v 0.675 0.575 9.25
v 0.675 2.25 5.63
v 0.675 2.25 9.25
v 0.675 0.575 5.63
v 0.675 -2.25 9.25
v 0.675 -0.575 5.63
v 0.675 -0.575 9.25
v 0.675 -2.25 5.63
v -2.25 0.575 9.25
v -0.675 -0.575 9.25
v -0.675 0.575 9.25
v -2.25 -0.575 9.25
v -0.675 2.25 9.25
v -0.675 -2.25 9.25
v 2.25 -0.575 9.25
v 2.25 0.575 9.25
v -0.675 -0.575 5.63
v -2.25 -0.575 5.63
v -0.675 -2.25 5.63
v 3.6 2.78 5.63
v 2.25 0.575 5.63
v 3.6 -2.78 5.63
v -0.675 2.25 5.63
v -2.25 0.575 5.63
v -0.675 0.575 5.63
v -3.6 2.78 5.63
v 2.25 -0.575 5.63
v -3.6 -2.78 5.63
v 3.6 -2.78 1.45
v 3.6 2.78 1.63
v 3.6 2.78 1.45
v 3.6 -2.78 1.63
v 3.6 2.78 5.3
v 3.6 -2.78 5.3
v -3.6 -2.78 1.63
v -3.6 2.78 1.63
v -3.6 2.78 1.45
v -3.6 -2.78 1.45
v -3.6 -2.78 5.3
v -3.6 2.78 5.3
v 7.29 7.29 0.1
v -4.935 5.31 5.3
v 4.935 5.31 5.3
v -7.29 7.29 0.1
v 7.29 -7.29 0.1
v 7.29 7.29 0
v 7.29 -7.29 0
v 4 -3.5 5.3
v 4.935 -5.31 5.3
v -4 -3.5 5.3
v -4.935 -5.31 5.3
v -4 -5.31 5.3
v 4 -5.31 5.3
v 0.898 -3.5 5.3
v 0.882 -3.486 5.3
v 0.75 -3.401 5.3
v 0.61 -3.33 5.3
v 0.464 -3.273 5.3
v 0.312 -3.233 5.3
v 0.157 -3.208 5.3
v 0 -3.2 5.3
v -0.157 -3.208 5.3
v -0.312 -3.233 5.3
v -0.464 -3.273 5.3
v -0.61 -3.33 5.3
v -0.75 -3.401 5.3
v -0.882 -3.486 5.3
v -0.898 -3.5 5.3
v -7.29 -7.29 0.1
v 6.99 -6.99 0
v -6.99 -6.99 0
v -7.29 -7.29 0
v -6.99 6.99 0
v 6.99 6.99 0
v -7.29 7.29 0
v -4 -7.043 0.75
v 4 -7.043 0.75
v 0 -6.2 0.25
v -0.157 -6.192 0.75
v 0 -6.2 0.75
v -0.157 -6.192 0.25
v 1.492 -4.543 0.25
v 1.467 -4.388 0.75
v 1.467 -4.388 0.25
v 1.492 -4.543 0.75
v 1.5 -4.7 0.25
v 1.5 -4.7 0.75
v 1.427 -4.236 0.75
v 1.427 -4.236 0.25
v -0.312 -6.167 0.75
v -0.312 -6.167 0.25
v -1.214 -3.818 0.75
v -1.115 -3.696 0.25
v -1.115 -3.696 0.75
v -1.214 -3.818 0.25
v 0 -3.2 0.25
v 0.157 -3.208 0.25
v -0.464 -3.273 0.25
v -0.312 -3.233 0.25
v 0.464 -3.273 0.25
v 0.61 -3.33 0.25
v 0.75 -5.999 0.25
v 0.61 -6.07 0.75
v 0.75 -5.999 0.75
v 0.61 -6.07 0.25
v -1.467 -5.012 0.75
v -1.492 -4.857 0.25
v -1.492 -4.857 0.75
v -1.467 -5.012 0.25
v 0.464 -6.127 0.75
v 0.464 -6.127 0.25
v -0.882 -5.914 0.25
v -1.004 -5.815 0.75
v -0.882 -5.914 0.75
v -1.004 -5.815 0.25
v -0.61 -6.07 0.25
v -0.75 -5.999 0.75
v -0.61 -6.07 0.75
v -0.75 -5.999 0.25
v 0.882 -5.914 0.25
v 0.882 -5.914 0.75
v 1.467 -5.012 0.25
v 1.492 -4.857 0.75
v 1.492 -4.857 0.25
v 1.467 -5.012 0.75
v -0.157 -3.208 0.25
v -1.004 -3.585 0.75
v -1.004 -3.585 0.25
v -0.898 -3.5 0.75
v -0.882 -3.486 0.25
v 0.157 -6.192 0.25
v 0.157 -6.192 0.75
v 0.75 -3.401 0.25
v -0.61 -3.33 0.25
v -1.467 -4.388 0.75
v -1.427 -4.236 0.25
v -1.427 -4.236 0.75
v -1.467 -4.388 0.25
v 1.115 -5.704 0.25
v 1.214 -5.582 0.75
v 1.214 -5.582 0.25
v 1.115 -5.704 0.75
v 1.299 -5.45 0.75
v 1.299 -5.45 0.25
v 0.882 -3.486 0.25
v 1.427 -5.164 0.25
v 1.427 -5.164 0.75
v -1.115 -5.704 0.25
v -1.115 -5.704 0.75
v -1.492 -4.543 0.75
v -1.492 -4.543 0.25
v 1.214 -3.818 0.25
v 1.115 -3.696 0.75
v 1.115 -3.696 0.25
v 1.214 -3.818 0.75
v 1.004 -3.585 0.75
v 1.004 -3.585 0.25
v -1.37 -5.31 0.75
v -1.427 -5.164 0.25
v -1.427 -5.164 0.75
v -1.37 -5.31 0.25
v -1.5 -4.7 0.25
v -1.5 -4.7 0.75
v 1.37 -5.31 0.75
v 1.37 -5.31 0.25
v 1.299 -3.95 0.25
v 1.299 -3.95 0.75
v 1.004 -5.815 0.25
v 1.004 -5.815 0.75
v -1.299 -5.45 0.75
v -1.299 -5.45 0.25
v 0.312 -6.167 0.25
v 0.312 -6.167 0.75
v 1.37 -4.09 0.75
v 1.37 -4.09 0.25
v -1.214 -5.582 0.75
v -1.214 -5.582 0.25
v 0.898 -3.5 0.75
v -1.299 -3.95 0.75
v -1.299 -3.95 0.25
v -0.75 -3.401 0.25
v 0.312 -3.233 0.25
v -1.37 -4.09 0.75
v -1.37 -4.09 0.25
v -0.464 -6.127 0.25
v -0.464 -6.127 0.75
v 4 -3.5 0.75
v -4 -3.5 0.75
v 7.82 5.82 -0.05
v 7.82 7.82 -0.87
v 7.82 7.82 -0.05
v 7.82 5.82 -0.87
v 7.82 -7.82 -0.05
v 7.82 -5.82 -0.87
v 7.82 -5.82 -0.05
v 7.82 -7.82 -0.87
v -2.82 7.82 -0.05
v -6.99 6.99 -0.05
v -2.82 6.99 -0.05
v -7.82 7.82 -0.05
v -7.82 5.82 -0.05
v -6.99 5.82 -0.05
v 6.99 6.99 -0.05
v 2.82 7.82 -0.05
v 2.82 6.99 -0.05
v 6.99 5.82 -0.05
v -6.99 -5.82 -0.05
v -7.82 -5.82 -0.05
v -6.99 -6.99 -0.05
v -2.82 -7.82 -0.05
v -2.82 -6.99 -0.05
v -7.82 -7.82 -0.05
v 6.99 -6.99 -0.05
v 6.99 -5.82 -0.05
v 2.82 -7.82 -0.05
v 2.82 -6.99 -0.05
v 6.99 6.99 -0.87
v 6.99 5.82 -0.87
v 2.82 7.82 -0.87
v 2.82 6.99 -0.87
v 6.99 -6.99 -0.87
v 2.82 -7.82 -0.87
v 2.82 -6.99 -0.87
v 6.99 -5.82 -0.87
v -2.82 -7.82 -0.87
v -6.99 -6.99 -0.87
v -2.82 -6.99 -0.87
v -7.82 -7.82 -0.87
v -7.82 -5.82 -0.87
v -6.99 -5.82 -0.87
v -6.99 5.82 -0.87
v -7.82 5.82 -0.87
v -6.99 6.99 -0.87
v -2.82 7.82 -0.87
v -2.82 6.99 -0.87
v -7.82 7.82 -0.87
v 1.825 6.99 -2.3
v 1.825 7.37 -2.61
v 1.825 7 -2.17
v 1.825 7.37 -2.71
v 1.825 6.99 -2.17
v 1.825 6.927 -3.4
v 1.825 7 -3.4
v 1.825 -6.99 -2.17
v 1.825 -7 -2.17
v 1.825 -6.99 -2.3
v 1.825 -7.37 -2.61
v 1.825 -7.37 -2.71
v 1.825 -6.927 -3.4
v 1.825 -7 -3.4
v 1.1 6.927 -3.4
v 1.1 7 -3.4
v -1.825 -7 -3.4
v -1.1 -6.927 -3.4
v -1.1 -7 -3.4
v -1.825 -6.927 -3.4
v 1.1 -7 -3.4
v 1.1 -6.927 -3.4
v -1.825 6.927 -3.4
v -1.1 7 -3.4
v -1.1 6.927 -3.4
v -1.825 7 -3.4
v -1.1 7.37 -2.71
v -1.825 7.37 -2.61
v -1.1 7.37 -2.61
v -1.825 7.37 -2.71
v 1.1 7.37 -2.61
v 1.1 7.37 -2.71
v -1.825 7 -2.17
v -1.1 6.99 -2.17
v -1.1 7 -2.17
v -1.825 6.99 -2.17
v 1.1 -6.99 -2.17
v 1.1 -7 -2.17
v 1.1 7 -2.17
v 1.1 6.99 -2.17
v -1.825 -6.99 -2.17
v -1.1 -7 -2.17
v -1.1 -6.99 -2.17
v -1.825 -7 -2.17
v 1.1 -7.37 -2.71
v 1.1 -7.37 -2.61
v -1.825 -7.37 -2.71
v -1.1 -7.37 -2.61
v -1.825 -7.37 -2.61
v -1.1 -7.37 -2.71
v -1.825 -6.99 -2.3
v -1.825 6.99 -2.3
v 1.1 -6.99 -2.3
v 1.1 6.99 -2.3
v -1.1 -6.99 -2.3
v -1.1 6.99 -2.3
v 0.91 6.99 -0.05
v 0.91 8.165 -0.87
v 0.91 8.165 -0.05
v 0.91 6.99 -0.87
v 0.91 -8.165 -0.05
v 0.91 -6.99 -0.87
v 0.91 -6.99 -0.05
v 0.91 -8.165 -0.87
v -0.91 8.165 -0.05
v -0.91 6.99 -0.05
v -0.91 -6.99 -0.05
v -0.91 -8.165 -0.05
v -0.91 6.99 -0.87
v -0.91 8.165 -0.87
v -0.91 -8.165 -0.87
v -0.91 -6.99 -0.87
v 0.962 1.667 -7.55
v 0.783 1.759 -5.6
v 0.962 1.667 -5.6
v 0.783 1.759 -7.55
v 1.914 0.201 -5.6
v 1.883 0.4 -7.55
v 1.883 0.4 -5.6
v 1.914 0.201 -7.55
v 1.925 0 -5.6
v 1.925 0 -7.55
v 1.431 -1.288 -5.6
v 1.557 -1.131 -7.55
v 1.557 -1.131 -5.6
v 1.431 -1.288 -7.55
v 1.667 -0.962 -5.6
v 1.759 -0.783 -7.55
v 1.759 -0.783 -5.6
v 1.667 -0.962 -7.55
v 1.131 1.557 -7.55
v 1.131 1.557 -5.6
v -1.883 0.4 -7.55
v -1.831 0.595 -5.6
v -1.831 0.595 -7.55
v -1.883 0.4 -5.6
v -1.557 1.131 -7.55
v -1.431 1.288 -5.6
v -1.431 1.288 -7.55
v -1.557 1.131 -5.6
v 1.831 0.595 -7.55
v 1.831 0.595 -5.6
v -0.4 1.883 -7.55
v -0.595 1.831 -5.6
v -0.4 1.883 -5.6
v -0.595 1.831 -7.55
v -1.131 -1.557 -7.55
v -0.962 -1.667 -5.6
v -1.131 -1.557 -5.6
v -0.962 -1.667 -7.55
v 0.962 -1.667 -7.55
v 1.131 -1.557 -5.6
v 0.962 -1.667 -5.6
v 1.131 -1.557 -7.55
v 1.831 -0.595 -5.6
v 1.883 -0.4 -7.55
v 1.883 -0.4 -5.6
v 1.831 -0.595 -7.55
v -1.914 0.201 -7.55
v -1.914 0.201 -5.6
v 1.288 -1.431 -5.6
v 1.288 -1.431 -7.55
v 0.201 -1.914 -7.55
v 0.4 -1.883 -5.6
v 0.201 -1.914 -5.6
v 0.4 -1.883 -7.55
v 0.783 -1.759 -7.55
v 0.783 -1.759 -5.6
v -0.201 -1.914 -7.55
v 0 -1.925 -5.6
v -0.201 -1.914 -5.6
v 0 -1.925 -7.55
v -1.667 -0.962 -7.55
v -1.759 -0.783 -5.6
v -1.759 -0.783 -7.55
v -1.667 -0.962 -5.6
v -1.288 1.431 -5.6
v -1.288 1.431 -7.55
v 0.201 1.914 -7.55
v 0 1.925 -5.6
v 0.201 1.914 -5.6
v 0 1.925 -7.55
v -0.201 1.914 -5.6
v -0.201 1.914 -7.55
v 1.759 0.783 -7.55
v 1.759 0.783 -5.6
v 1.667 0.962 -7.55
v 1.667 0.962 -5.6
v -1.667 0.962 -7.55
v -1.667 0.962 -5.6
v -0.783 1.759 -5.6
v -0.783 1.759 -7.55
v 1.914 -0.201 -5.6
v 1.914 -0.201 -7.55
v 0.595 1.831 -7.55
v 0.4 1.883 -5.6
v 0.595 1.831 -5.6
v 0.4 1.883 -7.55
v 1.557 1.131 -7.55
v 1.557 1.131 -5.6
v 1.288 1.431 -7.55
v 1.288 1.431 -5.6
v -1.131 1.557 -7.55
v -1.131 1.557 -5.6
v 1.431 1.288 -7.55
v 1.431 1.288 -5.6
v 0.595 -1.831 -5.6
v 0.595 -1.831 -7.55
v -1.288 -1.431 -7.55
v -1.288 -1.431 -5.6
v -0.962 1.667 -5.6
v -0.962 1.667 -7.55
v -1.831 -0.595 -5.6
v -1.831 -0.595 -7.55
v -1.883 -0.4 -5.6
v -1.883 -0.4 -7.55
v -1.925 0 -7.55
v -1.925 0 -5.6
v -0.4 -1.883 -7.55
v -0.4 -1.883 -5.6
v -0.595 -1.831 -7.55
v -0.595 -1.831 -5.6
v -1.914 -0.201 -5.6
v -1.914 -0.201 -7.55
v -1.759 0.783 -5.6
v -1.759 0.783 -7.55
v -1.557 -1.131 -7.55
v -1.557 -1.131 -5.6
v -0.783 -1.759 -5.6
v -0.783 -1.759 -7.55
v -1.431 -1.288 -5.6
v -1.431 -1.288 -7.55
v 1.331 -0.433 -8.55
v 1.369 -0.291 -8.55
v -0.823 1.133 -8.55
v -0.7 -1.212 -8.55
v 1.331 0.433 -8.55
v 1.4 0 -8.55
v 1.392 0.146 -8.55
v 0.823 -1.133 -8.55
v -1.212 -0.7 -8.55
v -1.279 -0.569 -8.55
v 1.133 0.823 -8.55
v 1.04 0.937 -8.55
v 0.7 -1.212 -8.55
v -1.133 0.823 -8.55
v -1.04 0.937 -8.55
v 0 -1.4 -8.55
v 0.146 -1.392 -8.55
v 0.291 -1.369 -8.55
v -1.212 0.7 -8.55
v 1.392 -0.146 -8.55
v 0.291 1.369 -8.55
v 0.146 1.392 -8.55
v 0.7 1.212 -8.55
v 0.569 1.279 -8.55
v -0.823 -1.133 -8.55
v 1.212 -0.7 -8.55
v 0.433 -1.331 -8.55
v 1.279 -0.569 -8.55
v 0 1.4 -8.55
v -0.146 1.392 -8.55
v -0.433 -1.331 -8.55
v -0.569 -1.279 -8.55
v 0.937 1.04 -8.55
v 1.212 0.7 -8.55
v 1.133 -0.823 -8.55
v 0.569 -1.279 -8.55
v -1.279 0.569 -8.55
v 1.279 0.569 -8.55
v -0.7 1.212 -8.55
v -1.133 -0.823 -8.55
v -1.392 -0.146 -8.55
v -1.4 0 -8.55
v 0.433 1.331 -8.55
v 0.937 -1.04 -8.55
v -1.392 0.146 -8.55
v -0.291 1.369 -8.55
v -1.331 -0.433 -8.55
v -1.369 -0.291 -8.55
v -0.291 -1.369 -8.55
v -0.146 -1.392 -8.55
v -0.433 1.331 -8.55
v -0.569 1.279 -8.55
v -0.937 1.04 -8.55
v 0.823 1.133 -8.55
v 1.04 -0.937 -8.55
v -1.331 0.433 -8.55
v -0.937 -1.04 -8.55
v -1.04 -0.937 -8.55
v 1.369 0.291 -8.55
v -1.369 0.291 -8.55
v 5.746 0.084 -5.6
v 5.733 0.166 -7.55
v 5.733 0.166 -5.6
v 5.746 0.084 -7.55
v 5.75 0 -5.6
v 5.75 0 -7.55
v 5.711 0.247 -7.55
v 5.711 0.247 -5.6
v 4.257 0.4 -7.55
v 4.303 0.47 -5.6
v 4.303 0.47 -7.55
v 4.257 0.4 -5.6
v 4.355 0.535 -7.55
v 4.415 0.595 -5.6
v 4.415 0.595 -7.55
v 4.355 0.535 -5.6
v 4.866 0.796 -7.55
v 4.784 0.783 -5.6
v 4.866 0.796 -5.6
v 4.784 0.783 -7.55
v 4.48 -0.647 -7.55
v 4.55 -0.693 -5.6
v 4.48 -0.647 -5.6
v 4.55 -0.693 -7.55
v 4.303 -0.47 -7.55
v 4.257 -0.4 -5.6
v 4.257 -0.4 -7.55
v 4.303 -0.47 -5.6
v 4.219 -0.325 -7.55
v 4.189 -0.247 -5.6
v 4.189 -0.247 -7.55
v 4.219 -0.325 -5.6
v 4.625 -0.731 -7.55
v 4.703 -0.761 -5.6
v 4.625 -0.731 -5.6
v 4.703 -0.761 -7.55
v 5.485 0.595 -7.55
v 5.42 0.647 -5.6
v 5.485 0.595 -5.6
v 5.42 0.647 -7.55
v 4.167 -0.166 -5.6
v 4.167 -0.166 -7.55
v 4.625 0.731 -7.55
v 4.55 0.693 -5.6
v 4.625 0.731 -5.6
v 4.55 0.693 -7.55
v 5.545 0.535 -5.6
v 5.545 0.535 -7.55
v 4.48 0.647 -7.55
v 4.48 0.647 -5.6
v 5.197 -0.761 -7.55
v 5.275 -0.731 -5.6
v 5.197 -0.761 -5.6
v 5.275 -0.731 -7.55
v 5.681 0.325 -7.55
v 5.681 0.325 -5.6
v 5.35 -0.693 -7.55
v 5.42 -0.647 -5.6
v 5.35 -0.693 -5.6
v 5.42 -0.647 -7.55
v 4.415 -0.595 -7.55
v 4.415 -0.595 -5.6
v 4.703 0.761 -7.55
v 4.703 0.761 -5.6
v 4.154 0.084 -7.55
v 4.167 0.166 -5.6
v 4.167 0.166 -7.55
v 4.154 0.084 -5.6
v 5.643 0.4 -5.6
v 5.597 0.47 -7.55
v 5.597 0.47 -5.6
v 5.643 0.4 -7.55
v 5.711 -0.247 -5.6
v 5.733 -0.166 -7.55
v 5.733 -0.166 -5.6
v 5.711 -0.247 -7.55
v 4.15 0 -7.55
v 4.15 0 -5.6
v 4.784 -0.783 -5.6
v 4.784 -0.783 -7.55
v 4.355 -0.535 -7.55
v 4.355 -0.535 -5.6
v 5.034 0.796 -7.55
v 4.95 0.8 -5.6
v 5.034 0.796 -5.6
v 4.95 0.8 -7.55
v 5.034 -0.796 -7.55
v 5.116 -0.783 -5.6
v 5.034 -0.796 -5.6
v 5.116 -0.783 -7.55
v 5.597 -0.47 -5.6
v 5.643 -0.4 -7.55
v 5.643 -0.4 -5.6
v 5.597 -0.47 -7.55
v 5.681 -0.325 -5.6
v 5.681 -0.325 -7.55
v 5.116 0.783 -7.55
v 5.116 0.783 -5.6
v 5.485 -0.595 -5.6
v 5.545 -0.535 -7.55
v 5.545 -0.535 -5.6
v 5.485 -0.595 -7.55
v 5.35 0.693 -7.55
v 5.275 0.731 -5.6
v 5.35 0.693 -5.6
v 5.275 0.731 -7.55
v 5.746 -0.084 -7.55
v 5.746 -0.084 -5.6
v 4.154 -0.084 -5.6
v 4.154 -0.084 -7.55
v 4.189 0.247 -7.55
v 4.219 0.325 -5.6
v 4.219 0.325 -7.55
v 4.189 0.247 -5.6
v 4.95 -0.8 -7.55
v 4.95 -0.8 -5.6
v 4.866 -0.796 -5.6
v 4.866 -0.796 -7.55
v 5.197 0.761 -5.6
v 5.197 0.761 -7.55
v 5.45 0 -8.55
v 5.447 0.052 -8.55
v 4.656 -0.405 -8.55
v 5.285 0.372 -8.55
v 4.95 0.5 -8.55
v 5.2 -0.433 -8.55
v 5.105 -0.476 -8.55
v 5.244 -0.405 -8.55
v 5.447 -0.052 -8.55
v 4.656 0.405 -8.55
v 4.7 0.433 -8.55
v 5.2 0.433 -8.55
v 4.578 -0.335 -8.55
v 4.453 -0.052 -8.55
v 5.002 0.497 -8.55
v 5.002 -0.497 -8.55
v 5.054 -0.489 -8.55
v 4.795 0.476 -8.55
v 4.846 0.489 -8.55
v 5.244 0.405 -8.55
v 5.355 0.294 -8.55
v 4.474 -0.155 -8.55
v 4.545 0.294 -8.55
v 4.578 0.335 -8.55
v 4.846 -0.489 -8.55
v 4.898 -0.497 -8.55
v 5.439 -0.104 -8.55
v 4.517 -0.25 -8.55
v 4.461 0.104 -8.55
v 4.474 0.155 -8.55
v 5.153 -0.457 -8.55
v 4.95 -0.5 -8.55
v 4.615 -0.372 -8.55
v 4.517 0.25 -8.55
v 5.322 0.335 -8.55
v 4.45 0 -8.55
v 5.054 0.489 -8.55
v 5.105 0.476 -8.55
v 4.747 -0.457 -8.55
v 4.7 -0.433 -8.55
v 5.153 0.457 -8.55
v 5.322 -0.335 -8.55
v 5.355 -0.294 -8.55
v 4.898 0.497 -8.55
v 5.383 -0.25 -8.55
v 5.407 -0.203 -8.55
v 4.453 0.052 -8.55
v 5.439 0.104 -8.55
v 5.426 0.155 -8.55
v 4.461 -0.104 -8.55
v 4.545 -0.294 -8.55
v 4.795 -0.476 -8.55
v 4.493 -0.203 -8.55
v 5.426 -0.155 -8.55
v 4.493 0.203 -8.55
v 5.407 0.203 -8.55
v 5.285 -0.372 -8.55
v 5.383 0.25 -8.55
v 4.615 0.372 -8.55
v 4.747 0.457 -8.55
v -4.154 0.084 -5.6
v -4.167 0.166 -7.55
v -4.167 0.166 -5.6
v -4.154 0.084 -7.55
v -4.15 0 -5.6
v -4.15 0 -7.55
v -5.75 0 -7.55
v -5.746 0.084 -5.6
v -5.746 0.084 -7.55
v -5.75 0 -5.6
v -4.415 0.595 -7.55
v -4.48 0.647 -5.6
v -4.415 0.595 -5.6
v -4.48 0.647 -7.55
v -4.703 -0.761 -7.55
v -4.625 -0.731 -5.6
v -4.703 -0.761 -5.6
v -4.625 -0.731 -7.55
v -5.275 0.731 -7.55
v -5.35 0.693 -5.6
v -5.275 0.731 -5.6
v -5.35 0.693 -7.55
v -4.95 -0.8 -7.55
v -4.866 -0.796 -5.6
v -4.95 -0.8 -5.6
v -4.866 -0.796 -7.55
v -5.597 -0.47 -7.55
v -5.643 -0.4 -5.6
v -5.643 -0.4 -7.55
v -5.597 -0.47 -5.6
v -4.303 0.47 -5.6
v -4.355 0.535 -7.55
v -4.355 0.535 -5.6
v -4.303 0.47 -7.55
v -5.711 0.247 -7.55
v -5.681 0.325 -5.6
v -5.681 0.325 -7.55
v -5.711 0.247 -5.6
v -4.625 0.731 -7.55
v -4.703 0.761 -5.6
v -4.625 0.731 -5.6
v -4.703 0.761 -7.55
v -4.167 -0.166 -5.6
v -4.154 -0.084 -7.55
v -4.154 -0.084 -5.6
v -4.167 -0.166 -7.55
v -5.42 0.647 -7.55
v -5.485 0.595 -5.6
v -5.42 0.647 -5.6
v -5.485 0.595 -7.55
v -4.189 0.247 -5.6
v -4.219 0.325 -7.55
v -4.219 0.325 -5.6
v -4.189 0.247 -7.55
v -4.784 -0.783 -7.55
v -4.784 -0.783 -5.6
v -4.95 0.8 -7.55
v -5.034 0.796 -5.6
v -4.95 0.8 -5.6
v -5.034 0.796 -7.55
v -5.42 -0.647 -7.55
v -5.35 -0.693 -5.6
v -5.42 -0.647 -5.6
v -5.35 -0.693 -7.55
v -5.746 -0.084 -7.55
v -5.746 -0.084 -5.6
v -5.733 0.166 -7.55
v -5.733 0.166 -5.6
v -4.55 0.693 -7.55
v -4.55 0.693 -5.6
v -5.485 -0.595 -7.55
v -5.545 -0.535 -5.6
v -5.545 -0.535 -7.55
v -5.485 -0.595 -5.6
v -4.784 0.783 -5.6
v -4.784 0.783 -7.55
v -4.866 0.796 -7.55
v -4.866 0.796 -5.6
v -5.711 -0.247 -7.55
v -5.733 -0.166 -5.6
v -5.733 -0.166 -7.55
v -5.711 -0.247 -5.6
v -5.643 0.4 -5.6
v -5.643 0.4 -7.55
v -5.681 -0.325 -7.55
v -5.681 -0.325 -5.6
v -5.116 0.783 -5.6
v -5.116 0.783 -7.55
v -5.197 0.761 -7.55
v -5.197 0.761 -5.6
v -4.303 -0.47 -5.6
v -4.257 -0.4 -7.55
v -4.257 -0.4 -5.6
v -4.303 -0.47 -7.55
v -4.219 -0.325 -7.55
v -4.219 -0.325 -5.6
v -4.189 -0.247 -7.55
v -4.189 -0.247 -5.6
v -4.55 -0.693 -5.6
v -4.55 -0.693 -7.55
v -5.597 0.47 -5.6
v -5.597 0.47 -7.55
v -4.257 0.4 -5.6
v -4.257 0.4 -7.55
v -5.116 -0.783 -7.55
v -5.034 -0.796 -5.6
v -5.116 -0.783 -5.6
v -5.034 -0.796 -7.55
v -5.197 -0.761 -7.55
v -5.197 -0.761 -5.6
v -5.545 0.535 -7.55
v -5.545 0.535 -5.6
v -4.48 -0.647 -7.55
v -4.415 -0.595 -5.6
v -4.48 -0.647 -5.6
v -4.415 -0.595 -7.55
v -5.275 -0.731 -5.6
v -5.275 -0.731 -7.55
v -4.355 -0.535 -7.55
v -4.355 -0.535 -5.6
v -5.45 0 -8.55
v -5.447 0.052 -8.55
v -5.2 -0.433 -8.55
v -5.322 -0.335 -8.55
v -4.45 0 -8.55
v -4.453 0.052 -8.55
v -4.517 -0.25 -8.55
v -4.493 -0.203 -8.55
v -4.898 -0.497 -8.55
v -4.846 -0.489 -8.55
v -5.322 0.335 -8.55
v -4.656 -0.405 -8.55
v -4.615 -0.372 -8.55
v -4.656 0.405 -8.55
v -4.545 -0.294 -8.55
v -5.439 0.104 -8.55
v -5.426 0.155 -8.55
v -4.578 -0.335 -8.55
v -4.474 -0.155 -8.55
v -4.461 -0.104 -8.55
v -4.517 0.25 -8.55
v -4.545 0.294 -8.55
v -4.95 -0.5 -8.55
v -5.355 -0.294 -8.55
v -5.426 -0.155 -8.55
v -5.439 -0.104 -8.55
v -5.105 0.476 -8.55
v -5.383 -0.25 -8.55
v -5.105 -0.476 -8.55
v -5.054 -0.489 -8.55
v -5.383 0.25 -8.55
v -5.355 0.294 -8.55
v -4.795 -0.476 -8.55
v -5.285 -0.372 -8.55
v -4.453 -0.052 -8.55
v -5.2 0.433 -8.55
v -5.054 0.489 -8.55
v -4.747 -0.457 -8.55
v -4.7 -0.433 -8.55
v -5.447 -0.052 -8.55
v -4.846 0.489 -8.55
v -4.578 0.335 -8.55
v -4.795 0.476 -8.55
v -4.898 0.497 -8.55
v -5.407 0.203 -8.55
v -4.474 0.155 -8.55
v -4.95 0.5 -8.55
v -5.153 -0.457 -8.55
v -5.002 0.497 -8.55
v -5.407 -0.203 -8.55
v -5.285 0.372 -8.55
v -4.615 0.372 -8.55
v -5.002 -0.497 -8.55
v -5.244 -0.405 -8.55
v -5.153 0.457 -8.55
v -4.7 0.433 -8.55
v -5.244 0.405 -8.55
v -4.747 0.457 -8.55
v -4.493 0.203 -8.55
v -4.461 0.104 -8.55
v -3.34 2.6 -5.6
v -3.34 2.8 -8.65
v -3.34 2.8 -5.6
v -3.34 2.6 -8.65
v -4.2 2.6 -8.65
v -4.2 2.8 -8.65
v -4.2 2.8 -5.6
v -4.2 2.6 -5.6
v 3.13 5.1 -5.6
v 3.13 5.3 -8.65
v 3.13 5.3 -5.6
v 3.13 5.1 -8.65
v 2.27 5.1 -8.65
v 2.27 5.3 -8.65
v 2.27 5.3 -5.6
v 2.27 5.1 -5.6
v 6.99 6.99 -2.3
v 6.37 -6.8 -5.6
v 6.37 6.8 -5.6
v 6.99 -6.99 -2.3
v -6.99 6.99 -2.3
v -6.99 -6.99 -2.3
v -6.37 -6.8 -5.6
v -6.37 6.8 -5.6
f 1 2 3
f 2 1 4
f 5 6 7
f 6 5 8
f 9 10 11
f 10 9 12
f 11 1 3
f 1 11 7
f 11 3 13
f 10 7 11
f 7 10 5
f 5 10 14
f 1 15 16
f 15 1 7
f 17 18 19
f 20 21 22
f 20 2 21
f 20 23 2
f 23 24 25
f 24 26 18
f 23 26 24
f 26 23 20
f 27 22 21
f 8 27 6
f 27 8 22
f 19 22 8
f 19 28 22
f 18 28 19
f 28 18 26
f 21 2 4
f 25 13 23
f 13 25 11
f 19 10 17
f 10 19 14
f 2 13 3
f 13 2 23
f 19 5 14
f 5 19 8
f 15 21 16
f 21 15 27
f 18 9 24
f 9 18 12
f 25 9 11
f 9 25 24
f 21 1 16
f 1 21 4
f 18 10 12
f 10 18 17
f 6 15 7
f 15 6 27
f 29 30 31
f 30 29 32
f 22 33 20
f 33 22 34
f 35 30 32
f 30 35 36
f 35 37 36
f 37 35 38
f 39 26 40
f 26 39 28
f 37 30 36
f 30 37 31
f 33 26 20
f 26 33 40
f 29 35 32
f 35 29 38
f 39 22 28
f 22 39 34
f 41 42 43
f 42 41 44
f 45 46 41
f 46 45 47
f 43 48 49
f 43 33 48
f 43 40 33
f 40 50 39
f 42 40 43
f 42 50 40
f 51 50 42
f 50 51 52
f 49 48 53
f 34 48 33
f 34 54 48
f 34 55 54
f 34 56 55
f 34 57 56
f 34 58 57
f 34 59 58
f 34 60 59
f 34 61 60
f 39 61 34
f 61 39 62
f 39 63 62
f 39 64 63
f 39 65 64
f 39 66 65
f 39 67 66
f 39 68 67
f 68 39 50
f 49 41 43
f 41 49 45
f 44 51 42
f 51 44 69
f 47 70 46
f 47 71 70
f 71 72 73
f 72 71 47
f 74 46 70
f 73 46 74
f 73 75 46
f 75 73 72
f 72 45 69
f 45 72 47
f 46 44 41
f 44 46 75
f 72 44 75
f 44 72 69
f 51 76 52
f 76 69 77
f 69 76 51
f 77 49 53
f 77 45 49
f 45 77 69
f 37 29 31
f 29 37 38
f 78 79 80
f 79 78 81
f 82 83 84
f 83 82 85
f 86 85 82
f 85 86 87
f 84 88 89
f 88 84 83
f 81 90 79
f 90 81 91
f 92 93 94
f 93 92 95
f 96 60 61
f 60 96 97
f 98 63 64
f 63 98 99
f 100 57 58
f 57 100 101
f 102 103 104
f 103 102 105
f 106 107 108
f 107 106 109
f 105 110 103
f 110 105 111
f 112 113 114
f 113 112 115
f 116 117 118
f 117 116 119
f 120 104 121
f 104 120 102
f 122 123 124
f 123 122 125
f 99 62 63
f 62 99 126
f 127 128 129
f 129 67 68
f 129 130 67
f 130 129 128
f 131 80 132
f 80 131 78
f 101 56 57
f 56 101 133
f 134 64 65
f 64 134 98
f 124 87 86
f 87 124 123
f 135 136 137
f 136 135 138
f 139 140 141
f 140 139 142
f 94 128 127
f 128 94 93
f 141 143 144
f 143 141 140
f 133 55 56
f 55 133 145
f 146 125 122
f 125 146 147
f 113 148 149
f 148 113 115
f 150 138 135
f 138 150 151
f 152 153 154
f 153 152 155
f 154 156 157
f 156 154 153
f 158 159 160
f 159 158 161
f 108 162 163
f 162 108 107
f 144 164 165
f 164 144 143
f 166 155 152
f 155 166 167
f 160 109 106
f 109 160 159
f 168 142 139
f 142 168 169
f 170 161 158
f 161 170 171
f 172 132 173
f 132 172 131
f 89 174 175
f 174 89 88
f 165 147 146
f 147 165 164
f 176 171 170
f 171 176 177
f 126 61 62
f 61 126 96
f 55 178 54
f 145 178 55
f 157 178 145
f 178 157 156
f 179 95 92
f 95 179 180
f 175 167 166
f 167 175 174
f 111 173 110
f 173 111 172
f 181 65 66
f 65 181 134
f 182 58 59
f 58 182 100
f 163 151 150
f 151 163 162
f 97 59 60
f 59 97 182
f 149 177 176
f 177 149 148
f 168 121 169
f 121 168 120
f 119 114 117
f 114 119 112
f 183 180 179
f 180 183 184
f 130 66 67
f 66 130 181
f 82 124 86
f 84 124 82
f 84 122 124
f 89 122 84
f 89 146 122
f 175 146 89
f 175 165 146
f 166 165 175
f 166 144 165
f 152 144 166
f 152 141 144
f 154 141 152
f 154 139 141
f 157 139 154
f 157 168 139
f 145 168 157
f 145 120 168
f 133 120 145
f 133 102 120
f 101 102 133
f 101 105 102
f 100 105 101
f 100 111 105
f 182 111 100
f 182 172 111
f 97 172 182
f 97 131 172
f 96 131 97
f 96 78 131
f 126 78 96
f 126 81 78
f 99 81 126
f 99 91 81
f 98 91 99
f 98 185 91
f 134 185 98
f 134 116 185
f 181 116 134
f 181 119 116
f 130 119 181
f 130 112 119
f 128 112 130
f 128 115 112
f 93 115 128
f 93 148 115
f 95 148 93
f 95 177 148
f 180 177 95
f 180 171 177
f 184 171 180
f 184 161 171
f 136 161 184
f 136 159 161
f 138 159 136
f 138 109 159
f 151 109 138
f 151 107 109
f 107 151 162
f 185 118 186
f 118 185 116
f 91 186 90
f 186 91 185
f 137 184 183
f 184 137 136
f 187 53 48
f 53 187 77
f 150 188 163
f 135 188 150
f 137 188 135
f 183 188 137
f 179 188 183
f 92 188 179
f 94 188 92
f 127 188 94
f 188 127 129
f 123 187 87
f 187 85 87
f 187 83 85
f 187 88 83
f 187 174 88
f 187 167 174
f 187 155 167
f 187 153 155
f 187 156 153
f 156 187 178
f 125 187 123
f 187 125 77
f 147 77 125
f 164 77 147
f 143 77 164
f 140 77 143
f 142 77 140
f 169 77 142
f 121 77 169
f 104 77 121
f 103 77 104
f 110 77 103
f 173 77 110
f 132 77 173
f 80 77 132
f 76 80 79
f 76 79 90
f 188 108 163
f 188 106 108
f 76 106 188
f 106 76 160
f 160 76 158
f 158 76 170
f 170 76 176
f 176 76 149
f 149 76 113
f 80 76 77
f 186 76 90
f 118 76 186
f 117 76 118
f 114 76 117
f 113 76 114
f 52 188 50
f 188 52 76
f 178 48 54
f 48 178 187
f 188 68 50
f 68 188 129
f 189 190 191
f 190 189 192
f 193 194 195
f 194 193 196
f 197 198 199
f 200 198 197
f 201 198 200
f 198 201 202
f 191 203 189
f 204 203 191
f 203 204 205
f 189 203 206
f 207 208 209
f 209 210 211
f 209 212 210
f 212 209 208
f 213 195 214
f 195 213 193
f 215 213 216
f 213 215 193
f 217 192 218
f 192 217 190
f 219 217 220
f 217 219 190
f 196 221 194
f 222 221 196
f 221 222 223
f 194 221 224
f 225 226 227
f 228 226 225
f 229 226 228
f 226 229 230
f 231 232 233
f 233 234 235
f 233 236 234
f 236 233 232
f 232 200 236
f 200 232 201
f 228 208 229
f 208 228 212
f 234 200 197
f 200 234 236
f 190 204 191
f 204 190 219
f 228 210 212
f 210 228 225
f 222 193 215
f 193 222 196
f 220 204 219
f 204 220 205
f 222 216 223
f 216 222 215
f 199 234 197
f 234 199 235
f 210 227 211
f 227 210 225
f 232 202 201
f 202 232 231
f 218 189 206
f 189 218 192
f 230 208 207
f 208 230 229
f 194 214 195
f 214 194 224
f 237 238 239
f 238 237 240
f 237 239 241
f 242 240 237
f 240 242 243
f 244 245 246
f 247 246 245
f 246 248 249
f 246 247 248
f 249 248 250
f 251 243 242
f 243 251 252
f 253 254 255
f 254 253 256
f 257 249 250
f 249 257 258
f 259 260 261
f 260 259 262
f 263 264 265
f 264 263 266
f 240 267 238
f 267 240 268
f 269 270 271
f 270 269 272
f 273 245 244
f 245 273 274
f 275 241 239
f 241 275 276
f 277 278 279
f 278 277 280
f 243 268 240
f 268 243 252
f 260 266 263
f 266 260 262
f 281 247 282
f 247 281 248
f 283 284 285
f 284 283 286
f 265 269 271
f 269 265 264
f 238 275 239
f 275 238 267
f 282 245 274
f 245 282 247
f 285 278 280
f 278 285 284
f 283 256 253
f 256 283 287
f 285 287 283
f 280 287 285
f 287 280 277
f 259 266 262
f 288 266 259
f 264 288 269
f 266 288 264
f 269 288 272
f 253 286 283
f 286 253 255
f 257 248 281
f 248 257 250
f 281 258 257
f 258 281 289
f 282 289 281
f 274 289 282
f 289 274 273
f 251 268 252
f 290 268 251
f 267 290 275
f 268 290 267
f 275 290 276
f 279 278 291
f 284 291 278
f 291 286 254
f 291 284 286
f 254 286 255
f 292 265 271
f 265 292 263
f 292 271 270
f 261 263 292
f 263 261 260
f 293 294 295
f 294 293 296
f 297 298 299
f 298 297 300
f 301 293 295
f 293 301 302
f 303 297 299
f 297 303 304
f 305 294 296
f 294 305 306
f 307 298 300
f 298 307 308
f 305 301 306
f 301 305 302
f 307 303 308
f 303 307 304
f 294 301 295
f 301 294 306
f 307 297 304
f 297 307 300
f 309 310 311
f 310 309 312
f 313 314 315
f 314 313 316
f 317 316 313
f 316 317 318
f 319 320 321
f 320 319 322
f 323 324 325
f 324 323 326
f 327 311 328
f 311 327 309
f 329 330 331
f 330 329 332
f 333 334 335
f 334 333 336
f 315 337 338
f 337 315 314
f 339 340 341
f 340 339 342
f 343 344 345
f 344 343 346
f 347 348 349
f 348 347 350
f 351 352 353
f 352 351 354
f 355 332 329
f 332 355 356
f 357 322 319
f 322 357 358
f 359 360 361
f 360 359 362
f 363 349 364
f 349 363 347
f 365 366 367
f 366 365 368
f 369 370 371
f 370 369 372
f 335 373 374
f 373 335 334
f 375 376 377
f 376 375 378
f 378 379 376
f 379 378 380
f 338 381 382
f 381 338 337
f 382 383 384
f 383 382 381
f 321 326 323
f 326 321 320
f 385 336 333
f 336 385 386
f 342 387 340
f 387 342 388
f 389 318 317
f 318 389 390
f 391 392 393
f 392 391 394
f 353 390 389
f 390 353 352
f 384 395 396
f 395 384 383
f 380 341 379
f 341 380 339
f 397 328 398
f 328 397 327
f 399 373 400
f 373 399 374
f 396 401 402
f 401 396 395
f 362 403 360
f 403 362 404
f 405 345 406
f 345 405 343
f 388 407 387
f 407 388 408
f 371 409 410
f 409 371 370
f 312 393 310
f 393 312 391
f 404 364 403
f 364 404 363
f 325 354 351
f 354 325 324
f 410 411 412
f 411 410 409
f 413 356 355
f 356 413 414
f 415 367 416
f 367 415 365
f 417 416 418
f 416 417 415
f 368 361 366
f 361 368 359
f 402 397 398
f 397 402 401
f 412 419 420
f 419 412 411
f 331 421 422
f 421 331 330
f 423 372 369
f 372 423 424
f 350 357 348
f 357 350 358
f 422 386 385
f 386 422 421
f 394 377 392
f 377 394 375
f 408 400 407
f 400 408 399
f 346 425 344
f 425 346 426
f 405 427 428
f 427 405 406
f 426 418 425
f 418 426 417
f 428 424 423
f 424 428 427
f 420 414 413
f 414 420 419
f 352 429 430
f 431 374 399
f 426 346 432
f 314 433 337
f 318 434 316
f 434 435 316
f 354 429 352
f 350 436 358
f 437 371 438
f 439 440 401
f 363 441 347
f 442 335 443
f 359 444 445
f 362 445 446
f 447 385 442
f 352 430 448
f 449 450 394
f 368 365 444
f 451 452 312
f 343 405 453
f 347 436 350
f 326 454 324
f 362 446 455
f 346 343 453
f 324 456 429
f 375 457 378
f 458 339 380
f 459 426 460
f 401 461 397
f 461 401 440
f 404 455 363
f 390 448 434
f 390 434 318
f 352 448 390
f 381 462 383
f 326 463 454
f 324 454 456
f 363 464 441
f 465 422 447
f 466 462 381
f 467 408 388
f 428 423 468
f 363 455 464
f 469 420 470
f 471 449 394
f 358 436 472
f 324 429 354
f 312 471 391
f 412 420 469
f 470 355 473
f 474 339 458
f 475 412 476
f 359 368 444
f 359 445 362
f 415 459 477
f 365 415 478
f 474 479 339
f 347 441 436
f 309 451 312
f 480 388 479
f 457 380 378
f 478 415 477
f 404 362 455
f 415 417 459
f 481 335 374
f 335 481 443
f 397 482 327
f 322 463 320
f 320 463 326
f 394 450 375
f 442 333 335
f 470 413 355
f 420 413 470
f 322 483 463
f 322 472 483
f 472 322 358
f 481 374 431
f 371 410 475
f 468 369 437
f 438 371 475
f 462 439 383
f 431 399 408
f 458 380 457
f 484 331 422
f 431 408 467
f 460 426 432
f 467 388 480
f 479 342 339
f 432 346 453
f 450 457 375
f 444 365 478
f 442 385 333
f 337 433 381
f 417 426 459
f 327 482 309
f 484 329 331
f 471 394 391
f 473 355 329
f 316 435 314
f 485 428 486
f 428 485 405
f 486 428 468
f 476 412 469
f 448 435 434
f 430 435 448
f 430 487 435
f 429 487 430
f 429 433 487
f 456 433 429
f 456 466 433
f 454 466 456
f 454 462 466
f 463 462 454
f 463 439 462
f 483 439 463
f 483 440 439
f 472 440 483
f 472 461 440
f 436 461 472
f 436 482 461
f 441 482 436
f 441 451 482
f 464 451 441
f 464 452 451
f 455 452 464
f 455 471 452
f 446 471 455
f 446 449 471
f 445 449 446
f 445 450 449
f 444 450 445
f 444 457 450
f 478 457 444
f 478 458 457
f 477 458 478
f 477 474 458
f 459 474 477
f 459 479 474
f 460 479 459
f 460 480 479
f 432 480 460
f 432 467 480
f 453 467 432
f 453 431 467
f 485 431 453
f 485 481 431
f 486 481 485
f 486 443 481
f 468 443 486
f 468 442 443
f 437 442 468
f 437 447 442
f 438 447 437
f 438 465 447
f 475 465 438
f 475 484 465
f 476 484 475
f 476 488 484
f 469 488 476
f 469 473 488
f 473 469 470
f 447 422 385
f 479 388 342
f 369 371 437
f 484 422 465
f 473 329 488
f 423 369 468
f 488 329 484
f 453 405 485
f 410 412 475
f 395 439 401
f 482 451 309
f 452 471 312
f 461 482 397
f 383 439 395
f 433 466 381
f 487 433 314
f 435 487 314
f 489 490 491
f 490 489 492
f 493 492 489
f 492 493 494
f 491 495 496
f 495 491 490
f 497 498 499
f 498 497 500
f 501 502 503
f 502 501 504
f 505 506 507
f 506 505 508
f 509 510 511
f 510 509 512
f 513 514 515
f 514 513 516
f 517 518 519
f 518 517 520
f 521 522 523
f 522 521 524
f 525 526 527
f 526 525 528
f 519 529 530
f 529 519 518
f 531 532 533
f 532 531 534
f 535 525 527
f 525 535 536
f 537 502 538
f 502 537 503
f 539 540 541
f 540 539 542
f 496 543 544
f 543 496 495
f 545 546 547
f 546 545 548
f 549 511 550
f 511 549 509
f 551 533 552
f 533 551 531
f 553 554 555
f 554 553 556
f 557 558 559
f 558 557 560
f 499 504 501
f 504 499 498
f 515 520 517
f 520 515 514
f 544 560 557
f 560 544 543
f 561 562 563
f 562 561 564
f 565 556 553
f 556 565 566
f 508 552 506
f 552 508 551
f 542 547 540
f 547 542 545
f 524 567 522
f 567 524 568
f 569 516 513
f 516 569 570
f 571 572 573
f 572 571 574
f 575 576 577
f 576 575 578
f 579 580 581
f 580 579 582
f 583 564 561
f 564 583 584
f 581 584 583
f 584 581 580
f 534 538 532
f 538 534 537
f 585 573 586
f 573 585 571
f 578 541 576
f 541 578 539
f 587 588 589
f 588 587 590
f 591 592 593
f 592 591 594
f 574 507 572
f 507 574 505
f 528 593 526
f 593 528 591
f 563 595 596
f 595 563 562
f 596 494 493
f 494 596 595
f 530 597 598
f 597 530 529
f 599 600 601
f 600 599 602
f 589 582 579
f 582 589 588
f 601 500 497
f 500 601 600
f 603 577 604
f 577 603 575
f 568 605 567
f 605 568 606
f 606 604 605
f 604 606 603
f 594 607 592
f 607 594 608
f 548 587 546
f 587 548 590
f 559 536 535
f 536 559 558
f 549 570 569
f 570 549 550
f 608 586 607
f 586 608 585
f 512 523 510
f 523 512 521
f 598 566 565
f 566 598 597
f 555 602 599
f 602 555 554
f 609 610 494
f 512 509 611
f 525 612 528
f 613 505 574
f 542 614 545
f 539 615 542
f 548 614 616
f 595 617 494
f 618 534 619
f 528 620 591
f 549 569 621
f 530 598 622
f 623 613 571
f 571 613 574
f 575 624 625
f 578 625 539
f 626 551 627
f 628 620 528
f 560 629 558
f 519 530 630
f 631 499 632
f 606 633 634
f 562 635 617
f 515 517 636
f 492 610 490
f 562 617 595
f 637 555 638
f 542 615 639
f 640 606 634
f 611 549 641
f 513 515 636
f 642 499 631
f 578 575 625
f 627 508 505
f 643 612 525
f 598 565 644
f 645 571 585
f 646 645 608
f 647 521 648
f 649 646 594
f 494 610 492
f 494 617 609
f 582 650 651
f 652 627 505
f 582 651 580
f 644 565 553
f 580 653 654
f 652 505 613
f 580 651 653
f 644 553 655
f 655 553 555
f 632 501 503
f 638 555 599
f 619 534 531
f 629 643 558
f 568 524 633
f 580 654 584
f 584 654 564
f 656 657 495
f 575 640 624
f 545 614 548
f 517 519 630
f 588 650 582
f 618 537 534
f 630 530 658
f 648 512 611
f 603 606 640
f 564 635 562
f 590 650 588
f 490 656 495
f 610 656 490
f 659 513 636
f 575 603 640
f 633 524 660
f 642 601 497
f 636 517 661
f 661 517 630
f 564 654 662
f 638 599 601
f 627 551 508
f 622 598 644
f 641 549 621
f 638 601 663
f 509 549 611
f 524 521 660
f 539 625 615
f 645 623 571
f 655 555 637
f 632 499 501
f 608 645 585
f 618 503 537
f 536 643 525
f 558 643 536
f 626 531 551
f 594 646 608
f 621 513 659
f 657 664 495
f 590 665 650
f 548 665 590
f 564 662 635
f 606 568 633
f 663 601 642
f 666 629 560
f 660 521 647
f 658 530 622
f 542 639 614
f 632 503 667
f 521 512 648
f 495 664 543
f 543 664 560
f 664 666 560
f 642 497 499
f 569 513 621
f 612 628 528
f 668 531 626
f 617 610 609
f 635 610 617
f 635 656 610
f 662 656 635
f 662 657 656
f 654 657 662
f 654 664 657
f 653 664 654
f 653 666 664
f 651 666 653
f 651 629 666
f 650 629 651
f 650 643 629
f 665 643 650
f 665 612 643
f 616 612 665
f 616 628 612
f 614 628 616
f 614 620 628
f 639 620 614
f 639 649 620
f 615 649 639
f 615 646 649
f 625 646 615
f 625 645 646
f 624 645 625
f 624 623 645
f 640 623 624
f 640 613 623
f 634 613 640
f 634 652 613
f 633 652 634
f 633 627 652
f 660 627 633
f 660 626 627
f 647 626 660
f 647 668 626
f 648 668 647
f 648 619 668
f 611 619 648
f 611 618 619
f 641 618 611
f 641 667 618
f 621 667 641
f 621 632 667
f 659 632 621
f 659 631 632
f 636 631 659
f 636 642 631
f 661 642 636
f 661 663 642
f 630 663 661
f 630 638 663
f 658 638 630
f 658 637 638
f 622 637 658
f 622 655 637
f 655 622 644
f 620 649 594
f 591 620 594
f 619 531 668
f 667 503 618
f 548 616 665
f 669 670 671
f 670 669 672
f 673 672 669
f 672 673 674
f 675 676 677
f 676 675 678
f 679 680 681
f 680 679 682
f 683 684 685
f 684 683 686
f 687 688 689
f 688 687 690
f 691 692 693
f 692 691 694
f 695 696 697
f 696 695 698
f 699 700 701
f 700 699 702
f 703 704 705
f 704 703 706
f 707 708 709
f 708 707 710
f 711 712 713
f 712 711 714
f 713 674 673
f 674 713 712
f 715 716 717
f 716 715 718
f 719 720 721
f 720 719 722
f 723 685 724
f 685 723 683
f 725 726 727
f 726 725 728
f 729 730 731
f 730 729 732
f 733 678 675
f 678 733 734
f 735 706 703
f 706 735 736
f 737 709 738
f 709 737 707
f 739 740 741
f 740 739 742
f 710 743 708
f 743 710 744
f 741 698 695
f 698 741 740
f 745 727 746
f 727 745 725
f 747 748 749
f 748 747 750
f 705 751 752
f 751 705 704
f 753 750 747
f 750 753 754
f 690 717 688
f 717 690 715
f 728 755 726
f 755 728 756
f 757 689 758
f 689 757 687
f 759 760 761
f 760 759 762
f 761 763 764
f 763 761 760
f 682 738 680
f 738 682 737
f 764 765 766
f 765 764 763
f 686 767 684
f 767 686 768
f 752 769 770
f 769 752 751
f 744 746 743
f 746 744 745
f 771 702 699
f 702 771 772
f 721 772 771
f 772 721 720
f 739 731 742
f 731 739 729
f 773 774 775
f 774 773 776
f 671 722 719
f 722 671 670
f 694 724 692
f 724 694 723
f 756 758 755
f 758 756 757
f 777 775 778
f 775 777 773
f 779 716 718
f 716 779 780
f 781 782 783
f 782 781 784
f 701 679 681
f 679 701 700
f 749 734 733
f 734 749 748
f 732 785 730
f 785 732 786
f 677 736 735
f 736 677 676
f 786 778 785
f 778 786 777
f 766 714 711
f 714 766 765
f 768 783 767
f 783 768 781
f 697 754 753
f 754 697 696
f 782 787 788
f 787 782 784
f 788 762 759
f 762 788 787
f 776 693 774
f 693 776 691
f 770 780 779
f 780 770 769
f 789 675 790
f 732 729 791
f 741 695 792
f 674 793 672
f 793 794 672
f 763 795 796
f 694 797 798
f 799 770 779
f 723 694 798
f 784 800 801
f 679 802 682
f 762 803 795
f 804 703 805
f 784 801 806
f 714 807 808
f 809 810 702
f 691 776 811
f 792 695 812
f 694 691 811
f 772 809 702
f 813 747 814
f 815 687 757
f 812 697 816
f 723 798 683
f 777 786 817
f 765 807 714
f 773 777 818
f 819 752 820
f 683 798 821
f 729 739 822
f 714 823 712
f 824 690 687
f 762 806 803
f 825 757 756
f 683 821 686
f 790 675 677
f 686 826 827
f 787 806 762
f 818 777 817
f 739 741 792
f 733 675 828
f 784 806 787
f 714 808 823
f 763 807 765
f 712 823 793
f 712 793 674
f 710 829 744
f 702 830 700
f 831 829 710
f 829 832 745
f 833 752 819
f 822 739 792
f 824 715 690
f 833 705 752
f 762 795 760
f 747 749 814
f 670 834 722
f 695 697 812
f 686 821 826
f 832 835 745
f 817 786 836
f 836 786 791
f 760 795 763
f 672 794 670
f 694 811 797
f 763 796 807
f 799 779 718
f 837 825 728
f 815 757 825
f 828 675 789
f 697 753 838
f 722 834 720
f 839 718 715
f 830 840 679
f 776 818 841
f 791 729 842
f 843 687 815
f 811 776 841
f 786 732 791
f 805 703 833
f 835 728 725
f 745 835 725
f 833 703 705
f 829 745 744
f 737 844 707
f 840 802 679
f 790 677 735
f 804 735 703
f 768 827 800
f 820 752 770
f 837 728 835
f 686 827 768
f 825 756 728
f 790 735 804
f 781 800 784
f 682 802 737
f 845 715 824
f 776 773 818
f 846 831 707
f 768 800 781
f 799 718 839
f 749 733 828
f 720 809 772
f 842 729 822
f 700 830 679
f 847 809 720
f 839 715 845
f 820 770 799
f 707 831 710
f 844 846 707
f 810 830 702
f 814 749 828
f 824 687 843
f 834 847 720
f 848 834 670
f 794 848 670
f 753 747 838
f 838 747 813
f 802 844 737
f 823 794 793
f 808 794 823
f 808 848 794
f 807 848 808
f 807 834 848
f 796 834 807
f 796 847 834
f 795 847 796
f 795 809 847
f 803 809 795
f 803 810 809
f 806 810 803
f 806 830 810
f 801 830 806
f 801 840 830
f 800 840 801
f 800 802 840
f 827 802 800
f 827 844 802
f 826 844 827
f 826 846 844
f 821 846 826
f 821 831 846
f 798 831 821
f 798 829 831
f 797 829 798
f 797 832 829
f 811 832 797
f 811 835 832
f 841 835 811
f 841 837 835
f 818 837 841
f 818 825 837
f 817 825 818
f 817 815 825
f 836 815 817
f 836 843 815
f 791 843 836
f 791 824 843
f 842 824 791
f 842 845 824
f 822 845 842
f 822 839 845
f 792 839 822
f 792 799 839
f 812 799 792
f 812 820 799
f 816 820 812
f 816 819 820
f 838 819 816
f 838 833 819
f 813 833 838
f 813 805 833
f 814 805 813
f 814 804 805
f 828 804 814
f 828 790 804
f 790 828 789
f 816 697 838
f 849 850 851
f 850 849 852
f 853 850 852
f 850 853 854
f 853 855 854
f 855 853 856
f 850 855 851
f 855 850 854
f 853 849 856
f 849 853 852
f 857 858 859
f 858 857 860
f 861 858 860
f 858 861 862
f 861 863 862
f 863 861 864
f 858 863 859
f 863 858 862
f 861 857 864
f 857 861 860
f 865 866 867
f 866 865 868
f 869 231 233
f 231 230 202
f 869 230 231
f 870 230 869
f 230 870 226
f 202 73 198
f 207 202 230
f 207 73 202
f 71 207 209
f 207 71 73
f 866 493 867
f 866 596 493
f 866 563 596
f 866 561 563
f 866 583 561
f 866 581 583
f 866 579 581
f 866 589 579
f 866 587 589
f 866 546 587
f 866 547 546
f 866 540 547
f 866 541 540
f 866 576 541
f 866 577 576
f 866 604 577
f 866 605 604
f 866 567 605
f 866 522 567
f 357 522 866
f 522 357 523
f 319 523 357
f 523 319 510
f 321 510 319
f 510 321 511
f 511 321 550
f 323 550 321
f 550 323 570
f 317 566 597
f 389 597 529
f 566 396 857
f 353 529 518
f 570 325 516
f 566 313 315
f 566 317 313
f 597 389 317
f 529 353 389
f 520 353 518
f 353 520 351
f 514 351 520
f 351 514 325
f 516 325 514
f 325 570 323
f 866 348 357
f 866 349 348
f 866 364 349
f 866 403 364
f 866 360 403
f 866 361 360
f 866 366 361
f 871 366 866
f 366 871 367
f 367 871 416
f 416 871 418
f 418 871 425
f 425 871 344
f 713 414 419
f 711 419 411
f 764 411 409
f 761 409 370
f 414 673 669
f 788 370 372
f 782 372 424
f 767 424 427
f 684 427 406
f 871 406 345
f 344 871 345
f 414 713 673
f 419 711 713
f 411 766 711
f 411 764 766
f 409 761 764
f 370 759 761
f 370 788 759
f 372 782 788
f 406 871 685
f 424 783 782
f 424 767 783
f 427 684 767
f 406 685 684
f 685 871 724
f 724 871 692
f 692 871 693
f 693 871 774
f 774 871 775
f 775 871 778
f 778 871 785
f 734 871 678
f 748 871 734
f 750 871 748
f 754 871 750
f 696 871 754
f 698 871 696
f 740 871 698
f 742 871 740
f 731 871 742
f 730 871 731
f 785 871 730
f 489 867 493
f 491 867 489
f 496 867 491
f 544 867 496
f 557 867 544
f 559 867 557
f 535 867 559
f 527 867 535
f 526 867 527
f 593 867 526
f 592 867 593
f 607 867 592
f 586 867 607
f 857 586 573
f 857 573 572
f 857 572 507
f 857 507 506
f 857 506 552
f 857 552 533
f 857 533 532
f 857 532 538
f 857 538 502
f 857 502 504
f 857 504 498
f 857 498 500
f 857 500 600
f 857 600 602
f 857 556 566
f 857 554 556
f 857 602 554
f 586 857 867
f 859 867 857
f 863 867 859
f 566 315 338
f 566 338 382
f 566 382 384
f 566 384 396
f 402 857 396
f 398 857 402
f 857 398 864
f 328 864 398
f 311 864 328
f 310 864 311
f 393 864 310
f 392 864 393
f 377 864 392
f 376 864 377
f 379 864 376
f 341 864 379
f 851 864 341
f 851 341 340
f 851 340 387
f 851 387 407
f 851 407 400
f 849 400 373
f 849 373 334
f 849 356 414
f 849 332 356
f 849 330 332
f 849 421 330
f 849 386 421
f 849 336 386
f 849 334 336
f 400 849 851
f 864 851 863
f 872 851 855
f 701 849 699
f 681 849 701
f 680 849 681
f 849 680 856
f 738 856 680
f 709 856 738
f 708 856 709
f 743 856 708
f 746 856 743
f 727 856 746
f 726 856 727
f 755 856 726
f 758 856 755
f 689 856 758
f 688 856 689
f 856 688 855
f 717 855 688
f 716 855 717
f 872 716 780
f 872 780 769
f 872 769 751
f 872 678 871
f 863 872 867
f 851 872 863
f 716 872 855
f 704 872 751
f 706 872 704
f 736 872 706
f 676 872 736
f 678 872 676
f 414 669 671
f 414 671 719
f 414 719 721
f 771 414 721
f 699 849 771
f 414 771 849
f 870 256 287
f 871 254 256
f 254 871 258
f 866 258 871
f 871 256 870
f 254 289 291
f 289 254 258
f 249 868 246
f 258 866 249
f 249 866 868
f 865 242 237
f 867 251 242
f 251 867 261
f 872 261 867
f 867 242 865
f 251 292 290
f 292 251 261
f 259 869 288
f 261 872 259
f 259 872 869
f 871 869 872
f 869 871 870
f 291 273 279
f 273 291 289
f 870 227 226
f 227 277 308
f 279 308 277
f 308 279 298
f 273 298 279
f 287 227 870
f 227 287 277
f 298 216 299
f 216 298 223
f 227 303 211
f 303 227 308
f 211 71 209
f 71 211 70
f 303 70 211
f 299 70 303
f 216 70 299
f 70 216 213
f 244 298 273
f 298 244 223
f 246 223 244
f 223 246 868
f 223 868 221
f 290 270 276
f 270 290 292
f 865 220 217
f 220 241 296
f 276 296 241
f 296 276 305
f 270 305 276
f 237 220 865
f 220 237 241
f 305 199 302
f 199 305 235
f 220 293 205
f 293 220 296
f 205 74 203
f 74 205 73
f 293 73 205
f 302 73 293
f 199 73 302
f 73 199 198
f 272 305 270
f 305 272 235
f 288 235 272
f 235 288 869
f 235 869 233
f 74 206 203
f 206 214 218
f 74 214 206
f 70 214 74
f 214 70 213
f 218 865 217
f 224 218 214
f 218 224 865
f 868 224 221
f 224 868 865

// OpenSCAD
$fn=60;
/**
a cherry mx switch.

most of the measurements done with a caliper. some taken from
http://geekhack.org/index.php?topic=47744.0

This is just to illustrate and to drop in a a gross reference. It is mostly artistic apart from the steam and mounting plate dimensions
*/

// slightly adapted from https://www.thingiverse.com/thing:421524

module mx_switch(t = 0) {

translate([0, 0, 9.25])
//translate([0,0,-3])
{

	//1. steam
	color("#503000")
    translate([0, 0, -3.9 * t]) {
		//1.1. l-r tab is 1.35mm
		translate([0,0,-3.62/2])
			cube([1.35,4.5,3.62], center=true);
		//1.2. f-b tab is 1.15mm. it has a smal notch that i will ignore.
		translate([0,0,-3.62/2])
			cube([4.5,1.15,3.62], center=true);
		//1.3. base. it has a chamfered top that i will ignore.
		translate([0,0,-5.62])
			cube([7.2,5.56,4], center=true);
	}
	// 2. top
	color("grey"){
		difference(){
			// make a trapezoid with the general shape (volume?) of the top
			hull(){
				translate([0,0,-4]) //distance from top of switch... some i measured 3.9 others 4.2... so leaving at 4
					cube([9.87,10.62,0.1], center=true);
				translate([0,0,-4 -5.2]) // bottom has a measured 5.3... so move 5.2 and use the 0.1 bellow
					cube([14.58,14.58,0.1], center=true);
			}
            
			translate([0, 0, -5.8])
            cube([7.2,5.56,4], center=true);
            

		// and subtract:
		// the front led. NOTE: totally off... measured by eye. just for astetics
		// adding just so there is a visual cue of the direction
			translate([0,-4.7,-6])
				cylinder(r=3/2, h=6, center=true);
			translate([0,-5.5,-6])
				cube([8,4,5], center=true);
		// the four corners
			// TODO waste of time? this is all for looks, you shouldn't invade any of that space anyway...
		}
	}

	// 3. bottom
	color("green")
		// 3.1 main body volume
		hull(){
				translate([0,0,-4 -5.3]) //steam + top
					cube([13.98,13.98,0.1], center=true);
				translate([0,0,-4 -5.3 -2.2]) //steam + top + straigth part
					cube([13.98,13.98,0.1], center=true);
				translate([0,0,-4 -5.3 -5.5]) //steam + top + bottom (measured 5.5)
					cube([12.74,13.6,0.1], center=true);
		}
		// 3.2 tabs
		// note: only measured the lenght, if they are slightly off-center, this will be all wrong :)
		color("black")
		difference(){
			translate([0,0,-4 -5.3 -0.82/2]) //steam + top
				cube([15.64,15.64,0.82], center=true);
			translate([0,0,-4 -5.3 -0.82/2  ]) // front-back cut
				cube([5.64,20,0.82 +2], center=true);
			translate([0,0,-4 -5.3 -0.82/2  ]) //side cut
				cube([20,11.64,0.82 +2], center=true);
		}

		// 3.3 tab (plate snap on). to use this mechanically, you have to take into account the bending (as it will move the bottom part slightly up...) just for gross reference here for now
		color("white"){
			// 3.3.1 top
			translate([0,0,-4 -5.3 -0.82/2  ]) // front-back cut
				cube([1.82,16.33,0.82], center=true);
			// 3.3.2 bottom
			difference(){
				hull(){
					translate([0,0,-4 -5.3 -0.82/2 -1.76  ]) // front-back cut
						cube([3.65,14,0.1], center=true);
					translate([0,0,-4 -5.3 -0.82/2 -2.2  ]) // front-back cut
						cube([3.65,14.74,0.1], center=true);
					translate([0,0,-4 -5.3 -0.82/2 -2.89  ]) // front-back cut
						cube([3.65,14,0.1], center=true);
				}
				translate([0,0,-4 -5.3 -0.82/2 -1.76   ]) // front-back cut
					cube([2.2,20,4], center=true);

			}
		}

		// 4. bottom guides
		// again, i'm assuming everything is centered...
		color("darkGreen"){
			// 4.1 cylinder
			translate([0,0,-4 -5.3 -5.5 -2/2]) //steam + top + bottom (measured 5.5)
				cylinder(r=3.85/2, h=2, center=true);
			translate([0,0,-4 -5.3 -5.5 -2 -1/2]) //steam + top + bottom (measured 5.5)
				cylinder(r2=3.85/2, r1=2.8/2, h=1, center=true);
			// 4.2 PCB pins
			translate([4.95,0,-4 -5.3 -5.5 -2/2]) //steam + top + bottom (measured 5.5)
				cylinder(r=1.6/2, h=2, center=true);
			translate([4.95,0,-4 -5.3 -5.5 -2 -1/2]) //steam + top + bottom (measured 5.5)
				cylinder(r2=1.6/2, r1=1/2, h=1, center=true);
			translate([-4.95,0,-4 -5.3 -5.5 -2/2]) //steam + top + bottom (measured 5.5)
				cylinder(r=1.6/2, h=2, center=true);
			translate([-4.95,0,-4 -5.3 -5.5 -2 -1/2]) //steam + top + bottom (measured 5.5)
				cylinder(r2=1.6/2, r1=1/2, h=1, center=true);
		}

		// 5. pins
		color("orange"){
			translate([-3.77,2.7,-4 -5.3 -5.5 -3.1/2]) //steam + top + bottom (measured 5.5)
				cube([.86, 0.2,3.1], center=true);
			translate([2.7,5.2,-4 -5.3 -5.5 -3.1/2]) //steam + top + bottom (measured 5.5)
				cube([.86, 0.2,3.1], center=true);
		}

}

}

mx_switch();
